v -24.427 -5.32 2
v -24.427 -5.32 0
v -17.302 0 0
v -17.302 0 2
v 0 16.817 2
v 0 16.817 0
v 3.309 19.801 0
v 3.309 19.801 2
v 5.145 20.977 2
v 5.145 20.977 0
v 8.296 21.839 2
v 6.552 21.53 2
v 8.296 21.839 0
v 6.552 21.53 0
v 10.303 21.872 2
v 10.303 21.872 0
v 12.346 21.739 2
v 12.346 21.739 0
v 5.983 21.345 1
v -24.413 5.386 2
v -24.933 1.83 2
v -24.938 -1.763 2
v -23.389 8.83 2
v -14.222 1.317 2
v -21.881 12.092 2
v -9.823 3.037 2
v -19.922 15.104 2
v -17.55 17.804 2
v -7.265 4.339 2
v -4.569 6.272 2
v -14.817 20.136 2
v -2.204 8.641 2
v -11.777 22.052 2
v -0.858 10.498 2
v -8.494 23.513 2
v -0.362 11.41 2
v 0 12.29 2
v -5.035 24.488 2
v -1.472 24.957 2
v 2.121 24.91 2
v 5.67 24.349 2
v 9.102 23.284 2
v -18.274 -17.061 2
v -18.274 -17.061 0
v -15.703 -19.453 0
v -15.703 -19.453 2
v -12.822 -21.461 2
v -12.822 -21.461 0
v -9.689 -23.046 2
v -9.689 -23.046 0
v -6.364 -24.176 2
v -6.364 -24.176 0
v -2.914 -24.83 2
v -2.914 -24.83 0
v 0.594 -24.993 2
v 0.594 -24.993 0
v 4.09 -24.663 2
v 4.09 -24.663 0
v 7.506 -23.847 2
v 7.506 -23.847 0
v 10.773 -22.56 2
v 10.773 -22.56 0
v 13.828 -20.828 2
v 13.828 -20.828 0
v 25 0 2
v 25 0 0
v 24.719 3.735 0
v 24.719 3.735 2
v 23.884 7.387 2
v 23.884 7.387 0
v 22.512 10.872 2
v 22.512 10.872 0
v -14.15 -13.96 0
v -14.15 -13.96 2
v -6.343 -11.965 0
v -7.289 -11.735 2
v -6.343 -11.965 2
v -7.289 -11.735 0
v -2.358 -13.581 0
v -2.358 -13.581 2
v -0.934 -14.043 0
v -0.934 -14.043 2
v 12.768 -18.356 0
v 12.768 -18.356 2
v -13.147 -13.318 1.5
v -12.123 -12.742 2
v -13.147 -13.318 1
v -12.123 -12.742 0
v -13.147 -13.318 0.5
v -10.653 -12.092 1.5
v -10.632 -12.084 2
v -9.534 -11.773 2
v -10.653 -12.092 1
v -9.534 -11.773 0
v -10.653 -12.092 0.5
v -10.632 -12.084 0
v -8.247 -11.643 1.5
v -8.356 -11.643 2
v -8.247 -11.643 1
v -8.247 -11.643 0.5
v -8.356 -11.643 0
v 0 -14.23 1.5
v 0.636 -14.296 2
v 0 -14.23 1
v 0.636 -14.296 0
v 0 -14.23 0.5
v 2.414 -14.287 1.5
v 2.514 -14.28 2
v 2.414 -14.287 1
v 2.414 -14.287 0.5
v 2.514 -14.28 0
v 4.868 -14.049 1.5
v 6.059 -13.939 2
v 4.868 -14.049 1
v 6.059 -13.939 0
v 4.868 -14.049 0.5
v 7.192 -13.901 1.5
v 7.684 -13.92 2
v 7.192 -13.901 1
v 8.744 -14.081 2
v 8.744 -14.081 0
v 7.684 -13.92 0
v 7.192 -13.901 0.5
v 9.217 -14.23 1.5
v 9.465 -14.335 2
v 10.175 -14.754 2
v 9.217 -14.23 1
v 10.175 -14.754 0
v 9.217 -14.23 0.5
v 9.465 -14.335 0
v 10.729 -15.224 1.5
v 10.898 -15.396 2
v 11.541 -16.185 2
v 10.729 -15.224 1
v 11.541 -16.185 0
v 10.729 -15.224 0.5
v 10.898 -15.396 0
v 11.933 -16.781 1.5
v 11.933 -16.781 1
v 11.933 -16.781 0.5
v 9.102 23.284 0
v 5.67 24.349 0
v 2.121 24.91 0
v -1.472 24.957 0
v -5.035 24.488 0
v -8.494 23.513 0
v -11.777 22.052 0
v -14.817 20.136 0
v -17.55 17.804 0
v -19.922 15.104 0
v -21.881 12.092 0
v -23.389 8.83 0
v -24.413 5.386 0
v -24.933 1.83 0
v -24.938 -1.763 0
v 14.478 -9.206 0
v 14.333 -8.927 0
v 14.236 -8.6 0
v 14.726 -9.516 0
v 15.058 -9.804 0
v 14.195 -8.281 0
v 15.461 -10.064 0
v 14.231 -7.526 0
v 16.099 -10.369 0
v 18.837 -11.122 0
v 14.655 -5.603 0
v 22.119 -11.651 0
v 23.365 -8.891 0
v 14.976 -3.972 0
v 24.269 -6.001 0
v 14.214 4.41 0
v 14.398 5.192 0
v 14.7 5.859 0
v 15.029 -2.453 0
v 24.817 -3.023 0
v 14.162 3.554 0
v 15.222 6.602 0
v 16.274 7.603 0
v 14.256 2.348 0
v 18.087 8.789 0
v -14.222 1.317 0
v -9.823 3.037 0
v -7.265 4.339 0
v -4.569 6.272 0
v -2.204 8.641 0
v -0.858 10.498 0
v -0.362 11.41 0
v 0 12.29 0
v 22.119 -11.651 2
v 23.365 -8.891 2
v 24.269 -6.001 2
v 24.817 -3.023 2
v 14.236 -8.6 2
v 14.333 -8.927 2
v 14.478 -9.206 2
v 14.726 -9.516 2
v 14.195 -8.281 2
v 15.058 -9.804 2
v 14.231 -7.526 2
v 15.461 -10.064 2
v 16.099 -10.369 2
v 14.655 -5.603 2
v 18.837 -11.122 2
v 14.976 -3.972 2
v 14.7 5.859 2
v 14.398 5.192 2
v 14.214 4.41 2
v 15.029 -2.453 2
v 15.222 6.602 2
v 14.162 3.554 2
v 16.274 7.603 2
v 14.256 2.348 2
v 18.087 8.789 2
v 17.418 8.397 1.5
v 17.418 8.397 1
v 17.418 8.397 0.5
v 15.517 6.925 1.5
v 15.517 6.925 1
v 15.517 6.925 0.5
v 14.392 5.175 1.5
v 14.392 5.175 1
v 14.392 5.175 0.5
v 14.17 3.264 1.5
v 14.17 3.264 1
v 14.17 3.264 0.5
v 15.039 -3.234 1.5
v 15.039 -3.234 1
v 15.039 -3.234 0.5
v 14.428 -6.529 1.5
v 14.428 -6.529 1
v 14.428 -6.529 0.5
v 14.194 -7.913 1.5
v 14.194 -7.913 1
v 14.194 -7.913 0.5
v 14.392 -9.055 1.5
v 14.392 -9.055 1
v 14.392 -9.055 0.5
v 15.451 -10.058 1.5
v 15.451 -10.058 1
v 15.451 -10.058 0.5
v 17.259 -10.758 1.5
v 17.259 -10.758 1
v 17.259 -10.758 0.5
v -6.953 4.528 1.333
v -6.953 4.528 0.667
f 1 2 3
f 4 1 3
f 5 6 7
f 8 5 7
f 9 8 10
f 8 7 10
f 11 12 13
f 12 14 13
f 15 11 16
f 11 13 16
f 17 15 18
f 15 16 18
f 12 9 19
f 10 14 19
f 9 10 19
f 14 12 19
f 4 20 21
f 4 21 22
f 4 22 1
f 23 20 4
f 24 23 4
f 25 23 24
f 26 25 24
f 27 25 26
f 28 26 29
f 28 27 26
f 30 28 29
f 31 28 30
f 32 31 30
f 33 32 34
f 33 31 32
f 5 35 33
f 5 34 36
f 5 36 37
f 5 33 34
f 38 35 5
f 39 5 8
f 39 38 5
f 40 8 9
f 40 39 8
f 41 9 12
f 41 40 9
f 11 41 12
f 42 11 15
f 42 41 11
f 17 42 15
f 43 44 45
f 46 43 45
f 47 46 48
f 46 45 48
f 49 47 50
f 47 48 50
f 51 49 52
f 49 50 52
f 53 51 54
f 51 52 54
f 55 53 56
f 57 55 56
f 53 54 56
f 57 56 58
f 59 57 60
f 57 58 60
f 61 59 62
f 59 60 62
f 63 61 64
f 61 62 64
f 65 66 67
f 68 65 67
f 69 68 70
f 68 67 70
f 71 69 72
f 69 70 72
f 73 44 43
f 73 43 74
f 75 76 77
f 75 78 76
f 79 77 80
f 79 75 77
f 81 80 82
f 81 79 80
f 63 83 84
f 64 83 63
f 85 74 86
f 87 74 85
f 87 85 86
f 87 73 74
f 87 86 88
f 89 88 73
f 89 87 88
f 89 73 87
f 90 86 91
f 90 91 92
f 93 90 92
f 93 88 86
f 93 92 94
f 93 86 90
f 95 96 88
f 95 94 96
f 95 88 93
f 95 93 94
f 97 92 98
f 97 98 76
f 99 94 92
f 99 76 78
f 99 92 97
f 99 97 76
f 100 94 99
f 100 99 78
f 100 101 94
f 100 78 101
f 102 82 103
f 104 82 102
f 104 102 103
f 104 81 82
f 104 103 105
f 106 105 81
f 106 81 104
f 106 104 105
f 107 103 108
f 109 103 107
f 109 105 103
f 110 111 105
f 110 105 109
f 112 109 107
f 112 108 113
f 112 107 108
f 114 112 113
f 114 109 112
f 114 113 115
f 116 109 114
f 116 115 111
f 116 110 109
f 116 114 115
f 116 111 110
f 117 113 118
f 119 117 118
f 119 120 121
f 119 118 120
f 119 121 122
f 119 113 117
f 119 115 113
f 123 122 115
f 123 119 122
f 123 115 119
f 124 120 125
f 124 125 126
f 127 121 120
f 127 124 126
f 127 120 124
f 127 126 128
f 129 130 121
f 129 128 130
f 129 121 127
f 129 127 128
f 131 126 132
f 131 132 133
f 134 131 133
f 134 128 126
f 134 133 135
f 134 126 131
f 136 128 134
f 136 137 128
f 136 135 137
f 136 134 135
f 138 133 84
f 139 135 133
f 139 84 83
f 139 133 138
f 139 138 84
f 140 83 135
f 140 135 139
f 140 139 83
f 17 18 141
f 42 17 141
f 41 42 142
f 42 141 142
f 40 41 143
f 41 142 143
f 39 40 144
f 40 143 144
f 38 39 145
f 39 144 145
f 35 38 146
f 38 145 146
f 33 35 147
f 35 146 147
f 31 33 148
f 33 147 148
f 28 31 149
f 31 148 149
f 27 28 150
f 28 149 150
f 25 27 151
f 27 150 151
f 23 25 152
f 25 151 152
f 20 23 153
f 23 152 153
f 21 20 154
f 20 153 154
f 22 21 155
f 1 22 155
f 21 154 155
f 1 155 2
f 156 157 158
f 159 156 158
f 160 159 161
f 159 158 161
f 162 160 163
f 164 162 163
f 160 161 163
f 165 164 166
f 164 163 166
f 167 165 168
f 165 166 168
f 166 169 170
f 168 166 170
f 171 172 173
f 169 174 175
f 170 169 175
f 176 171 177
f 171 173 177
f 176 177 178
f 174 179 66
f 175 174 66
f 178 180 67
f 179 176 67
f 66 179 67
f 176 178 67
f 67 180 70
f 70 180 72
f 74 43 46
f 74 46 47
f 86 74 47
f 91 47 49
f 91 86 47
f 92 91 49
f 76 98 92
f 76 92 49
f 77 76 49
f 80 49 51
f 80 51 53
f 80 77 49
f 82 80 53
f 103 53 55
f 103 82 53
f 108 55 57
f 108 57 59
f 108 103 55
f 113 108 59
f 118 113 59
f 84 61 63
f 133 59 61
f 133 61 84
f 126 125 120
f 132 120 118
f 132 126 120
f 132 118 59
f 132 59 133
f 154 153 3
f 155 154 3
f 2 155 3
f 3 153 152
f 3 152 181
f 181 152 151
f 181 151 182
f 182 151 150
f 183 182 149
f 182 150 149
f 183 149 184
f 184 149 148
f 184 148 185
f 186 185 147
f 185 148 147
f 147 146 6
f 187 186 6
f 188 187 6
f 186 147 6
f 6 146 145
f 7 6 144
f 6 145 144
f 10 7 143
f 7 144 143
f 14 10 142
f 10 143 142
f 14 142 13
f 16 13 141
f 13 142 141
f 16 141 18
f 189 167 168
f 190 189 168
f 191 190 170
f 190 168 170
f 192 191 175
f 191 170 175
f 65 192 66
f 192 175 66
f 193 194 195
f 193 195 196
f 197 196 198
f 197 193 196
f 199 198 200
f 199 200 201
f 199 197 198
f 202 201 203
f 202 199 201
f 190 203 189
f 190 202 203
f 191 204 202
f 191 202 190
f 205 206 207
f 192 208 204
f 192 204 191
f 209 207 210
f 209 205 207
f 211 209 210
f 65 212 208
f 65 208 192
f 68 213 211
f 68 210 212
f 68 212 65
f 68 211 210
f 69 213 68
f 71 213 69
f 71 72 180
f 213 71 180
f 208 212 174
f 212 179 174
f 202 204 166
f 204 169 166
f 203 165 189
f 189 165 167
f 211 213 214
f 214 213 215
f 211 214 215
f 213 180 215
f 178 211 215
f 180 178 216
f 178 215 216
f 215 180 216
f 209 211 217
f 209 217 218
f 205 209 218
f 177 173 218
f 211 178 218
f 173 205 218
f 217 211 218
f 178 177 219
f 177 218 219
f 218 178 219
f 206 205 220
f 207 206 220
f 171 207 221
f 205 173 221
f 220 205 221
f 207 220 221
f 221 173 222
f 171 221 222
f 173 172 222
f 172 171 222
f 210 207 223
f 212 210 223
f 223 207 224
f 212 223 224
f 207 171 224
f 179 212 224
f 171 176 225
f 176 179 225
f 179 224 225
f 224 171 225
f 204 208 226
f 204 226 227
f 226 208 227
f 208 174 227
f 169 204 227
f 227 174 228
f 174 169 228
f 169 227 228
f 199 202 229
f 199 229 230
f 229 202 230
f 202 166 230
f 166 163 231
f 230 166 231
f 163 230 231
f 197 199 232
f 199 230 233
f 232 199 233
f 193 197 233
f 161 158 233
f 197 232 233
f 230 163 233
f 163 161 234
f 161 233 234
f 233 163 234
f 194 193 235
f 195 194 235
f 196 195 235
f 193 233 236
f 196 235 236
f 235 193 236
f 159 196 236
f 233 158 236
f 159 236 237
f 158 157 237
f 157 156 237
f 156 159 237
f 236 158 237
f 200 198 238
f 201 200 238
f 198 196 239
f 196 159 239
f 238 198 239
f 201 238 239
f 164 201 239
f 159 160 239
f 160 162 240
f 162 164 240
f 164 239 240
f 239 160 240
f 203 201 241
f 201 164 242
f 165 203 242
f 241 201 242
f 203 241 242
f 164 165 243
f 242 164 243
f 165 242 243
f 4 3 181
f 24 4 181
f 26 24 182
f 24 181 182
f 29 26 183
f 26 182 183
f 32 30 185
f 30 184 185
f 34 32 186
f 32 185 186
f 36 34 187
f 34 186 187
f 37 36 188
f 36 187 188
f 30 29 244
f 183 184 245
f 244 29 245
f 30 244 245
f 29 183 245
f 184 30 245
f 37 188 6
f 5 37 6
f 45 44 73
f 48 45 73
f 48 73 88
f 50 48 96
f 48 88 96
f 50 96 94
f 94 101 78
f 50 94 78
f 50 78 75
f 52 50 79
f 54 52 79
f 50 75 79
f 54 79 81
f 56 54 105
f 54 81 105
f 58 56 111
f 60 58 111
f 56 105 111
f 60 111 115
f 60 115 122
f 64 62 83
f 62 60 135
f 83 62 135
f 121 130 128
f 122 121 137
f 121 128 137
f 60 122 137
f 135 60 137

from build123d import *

# Parameters (mm, degrees)
F1_DEPTH = 2


with BuildPart() as f1:
    # F0 (on Top) → F1 (new body)
    with BuildSketch(Plane.XY):
        with BuildLine():
            ThreePointArc((22.1188925873, -11.6513772023), (24.2690370089, -6.001153444), (25, 0))
            ThreePointArc((25, 0), (24.3701069704, 5.5765478793), (22.5121691, 10.8720854676))
            add(Edge.make_bspline(
                [(22.5121691, 10.8720854676), (18.8895611428, 9.3055197167), (11.9102659407, 6.2896821538), (16.4364178682, -3.0658471403), (12.2521680449, -10.2063529762), (18.6615851191, -11.1474987265), (22.1188925873, -11.6513772023)],
                knots=[0, 0, 0, 0, 0.2780136343, 0.5343531988, 0.7479805585, 1, 1, 1, 1], degree=3))
        make_face()
    extrude(amount=F1_DEPTH)


with BuildPart() as f1b:
    # F0 (on Top) → F1, piece 2 (new body)
    with BuildSketch(Plane.XY):
        with BuildLine():
            add(Edge.make_bspline(
                [(0, 16.8172493577), (1.9144161531, 18.6824676113), (5.5934798745, 22.2645311542), (10.1584208321, 21.9120162799), (12.34633467, 21.7386296766)],
                knots=[0, 0, 0, 0, 0.5203475383, 1, 1, 1, 1], degree=3))
            ThreePointArc((12.34633467, 21.7386296766), (-14.8165901958, 20.1362522573), (-24.4273769181, -5.3200805351))
            add(Edge.make_bspline(
                [(-24.4273769181, -5.3200805351), (-22.2453911763, -3.3574319676), (-20.0634054345, -1.3947834001), (-17.3023622483, 0)],
                knots=[0, 0, 0, 0, 0.254891956, 0.254891956, 0.254891956, 0.254891956], degree=3))
            add(Edge.make_bspline(
                [(-17.3023622483, 0), (-14.1903788127, 1.5720662607), (-6.6472654424, 3.2397841474), (-0.8648455283, 9.7284013886), (0, 12.2895278037)],
                knots=[0.254891956, 0.254891956, 0.254891956, 0.254891956, 0.542181756, 0.8181160828, 0.8181160828, 0.8181160828, 0.8181160828], degree=3))
            Line((0, 12.2895278037), (0, 16.8172493577))
        make_face()
        with BuildLine():
            add(Edge.make_bspline(
                [(-24.4273769181, -5.3200805351), (-22.2453911763, -3.3574319676), (-20.0634054345, -1.3947834001), (-17.3023622483, 0)],
                knots=[0, 0, 0, 0, 0.254891956, 0.254891956, 0.254891956, 0.254891956], degree=3))
            Line((-24.4273769181, -5.3200805351), (-17.3023622483, 0))
        make_face()
    extrude(amount=F1_DEPTH)


with BuildPart() as f1c:
    # F0 (on Top) → F1, piece 3 (new body)
    with BuildSketch(Plane.XY):
        with BuildLine():
            ThreePointArc((-18.2737018092, -17.0608271249), (-2.9135456355, -24.8296446175), (13.8278126154, -20.8276642539))
            add(Edge.make_bspline(
                [(-18.2737018092, -17.0608271249), (-14.8332101277, -14.3400323801), (-8.3808524987, -9.228978734), (-0.4412585546, -15.998889193), (10.2263751779, -12.0238586347), (12.6576888155, -17.9664290501), (13.8278126154, -20.8276642539)],
                knots=[0, 0, 0, 0, 0.2769679297, 0.5181649262, 0.767240907, 1, 1, 1, 1], degree=3))
        make_face()
    extrude(amount=F1_DEPTH)


solid = Compound([f1.part, f1b.part, f1c.part])
